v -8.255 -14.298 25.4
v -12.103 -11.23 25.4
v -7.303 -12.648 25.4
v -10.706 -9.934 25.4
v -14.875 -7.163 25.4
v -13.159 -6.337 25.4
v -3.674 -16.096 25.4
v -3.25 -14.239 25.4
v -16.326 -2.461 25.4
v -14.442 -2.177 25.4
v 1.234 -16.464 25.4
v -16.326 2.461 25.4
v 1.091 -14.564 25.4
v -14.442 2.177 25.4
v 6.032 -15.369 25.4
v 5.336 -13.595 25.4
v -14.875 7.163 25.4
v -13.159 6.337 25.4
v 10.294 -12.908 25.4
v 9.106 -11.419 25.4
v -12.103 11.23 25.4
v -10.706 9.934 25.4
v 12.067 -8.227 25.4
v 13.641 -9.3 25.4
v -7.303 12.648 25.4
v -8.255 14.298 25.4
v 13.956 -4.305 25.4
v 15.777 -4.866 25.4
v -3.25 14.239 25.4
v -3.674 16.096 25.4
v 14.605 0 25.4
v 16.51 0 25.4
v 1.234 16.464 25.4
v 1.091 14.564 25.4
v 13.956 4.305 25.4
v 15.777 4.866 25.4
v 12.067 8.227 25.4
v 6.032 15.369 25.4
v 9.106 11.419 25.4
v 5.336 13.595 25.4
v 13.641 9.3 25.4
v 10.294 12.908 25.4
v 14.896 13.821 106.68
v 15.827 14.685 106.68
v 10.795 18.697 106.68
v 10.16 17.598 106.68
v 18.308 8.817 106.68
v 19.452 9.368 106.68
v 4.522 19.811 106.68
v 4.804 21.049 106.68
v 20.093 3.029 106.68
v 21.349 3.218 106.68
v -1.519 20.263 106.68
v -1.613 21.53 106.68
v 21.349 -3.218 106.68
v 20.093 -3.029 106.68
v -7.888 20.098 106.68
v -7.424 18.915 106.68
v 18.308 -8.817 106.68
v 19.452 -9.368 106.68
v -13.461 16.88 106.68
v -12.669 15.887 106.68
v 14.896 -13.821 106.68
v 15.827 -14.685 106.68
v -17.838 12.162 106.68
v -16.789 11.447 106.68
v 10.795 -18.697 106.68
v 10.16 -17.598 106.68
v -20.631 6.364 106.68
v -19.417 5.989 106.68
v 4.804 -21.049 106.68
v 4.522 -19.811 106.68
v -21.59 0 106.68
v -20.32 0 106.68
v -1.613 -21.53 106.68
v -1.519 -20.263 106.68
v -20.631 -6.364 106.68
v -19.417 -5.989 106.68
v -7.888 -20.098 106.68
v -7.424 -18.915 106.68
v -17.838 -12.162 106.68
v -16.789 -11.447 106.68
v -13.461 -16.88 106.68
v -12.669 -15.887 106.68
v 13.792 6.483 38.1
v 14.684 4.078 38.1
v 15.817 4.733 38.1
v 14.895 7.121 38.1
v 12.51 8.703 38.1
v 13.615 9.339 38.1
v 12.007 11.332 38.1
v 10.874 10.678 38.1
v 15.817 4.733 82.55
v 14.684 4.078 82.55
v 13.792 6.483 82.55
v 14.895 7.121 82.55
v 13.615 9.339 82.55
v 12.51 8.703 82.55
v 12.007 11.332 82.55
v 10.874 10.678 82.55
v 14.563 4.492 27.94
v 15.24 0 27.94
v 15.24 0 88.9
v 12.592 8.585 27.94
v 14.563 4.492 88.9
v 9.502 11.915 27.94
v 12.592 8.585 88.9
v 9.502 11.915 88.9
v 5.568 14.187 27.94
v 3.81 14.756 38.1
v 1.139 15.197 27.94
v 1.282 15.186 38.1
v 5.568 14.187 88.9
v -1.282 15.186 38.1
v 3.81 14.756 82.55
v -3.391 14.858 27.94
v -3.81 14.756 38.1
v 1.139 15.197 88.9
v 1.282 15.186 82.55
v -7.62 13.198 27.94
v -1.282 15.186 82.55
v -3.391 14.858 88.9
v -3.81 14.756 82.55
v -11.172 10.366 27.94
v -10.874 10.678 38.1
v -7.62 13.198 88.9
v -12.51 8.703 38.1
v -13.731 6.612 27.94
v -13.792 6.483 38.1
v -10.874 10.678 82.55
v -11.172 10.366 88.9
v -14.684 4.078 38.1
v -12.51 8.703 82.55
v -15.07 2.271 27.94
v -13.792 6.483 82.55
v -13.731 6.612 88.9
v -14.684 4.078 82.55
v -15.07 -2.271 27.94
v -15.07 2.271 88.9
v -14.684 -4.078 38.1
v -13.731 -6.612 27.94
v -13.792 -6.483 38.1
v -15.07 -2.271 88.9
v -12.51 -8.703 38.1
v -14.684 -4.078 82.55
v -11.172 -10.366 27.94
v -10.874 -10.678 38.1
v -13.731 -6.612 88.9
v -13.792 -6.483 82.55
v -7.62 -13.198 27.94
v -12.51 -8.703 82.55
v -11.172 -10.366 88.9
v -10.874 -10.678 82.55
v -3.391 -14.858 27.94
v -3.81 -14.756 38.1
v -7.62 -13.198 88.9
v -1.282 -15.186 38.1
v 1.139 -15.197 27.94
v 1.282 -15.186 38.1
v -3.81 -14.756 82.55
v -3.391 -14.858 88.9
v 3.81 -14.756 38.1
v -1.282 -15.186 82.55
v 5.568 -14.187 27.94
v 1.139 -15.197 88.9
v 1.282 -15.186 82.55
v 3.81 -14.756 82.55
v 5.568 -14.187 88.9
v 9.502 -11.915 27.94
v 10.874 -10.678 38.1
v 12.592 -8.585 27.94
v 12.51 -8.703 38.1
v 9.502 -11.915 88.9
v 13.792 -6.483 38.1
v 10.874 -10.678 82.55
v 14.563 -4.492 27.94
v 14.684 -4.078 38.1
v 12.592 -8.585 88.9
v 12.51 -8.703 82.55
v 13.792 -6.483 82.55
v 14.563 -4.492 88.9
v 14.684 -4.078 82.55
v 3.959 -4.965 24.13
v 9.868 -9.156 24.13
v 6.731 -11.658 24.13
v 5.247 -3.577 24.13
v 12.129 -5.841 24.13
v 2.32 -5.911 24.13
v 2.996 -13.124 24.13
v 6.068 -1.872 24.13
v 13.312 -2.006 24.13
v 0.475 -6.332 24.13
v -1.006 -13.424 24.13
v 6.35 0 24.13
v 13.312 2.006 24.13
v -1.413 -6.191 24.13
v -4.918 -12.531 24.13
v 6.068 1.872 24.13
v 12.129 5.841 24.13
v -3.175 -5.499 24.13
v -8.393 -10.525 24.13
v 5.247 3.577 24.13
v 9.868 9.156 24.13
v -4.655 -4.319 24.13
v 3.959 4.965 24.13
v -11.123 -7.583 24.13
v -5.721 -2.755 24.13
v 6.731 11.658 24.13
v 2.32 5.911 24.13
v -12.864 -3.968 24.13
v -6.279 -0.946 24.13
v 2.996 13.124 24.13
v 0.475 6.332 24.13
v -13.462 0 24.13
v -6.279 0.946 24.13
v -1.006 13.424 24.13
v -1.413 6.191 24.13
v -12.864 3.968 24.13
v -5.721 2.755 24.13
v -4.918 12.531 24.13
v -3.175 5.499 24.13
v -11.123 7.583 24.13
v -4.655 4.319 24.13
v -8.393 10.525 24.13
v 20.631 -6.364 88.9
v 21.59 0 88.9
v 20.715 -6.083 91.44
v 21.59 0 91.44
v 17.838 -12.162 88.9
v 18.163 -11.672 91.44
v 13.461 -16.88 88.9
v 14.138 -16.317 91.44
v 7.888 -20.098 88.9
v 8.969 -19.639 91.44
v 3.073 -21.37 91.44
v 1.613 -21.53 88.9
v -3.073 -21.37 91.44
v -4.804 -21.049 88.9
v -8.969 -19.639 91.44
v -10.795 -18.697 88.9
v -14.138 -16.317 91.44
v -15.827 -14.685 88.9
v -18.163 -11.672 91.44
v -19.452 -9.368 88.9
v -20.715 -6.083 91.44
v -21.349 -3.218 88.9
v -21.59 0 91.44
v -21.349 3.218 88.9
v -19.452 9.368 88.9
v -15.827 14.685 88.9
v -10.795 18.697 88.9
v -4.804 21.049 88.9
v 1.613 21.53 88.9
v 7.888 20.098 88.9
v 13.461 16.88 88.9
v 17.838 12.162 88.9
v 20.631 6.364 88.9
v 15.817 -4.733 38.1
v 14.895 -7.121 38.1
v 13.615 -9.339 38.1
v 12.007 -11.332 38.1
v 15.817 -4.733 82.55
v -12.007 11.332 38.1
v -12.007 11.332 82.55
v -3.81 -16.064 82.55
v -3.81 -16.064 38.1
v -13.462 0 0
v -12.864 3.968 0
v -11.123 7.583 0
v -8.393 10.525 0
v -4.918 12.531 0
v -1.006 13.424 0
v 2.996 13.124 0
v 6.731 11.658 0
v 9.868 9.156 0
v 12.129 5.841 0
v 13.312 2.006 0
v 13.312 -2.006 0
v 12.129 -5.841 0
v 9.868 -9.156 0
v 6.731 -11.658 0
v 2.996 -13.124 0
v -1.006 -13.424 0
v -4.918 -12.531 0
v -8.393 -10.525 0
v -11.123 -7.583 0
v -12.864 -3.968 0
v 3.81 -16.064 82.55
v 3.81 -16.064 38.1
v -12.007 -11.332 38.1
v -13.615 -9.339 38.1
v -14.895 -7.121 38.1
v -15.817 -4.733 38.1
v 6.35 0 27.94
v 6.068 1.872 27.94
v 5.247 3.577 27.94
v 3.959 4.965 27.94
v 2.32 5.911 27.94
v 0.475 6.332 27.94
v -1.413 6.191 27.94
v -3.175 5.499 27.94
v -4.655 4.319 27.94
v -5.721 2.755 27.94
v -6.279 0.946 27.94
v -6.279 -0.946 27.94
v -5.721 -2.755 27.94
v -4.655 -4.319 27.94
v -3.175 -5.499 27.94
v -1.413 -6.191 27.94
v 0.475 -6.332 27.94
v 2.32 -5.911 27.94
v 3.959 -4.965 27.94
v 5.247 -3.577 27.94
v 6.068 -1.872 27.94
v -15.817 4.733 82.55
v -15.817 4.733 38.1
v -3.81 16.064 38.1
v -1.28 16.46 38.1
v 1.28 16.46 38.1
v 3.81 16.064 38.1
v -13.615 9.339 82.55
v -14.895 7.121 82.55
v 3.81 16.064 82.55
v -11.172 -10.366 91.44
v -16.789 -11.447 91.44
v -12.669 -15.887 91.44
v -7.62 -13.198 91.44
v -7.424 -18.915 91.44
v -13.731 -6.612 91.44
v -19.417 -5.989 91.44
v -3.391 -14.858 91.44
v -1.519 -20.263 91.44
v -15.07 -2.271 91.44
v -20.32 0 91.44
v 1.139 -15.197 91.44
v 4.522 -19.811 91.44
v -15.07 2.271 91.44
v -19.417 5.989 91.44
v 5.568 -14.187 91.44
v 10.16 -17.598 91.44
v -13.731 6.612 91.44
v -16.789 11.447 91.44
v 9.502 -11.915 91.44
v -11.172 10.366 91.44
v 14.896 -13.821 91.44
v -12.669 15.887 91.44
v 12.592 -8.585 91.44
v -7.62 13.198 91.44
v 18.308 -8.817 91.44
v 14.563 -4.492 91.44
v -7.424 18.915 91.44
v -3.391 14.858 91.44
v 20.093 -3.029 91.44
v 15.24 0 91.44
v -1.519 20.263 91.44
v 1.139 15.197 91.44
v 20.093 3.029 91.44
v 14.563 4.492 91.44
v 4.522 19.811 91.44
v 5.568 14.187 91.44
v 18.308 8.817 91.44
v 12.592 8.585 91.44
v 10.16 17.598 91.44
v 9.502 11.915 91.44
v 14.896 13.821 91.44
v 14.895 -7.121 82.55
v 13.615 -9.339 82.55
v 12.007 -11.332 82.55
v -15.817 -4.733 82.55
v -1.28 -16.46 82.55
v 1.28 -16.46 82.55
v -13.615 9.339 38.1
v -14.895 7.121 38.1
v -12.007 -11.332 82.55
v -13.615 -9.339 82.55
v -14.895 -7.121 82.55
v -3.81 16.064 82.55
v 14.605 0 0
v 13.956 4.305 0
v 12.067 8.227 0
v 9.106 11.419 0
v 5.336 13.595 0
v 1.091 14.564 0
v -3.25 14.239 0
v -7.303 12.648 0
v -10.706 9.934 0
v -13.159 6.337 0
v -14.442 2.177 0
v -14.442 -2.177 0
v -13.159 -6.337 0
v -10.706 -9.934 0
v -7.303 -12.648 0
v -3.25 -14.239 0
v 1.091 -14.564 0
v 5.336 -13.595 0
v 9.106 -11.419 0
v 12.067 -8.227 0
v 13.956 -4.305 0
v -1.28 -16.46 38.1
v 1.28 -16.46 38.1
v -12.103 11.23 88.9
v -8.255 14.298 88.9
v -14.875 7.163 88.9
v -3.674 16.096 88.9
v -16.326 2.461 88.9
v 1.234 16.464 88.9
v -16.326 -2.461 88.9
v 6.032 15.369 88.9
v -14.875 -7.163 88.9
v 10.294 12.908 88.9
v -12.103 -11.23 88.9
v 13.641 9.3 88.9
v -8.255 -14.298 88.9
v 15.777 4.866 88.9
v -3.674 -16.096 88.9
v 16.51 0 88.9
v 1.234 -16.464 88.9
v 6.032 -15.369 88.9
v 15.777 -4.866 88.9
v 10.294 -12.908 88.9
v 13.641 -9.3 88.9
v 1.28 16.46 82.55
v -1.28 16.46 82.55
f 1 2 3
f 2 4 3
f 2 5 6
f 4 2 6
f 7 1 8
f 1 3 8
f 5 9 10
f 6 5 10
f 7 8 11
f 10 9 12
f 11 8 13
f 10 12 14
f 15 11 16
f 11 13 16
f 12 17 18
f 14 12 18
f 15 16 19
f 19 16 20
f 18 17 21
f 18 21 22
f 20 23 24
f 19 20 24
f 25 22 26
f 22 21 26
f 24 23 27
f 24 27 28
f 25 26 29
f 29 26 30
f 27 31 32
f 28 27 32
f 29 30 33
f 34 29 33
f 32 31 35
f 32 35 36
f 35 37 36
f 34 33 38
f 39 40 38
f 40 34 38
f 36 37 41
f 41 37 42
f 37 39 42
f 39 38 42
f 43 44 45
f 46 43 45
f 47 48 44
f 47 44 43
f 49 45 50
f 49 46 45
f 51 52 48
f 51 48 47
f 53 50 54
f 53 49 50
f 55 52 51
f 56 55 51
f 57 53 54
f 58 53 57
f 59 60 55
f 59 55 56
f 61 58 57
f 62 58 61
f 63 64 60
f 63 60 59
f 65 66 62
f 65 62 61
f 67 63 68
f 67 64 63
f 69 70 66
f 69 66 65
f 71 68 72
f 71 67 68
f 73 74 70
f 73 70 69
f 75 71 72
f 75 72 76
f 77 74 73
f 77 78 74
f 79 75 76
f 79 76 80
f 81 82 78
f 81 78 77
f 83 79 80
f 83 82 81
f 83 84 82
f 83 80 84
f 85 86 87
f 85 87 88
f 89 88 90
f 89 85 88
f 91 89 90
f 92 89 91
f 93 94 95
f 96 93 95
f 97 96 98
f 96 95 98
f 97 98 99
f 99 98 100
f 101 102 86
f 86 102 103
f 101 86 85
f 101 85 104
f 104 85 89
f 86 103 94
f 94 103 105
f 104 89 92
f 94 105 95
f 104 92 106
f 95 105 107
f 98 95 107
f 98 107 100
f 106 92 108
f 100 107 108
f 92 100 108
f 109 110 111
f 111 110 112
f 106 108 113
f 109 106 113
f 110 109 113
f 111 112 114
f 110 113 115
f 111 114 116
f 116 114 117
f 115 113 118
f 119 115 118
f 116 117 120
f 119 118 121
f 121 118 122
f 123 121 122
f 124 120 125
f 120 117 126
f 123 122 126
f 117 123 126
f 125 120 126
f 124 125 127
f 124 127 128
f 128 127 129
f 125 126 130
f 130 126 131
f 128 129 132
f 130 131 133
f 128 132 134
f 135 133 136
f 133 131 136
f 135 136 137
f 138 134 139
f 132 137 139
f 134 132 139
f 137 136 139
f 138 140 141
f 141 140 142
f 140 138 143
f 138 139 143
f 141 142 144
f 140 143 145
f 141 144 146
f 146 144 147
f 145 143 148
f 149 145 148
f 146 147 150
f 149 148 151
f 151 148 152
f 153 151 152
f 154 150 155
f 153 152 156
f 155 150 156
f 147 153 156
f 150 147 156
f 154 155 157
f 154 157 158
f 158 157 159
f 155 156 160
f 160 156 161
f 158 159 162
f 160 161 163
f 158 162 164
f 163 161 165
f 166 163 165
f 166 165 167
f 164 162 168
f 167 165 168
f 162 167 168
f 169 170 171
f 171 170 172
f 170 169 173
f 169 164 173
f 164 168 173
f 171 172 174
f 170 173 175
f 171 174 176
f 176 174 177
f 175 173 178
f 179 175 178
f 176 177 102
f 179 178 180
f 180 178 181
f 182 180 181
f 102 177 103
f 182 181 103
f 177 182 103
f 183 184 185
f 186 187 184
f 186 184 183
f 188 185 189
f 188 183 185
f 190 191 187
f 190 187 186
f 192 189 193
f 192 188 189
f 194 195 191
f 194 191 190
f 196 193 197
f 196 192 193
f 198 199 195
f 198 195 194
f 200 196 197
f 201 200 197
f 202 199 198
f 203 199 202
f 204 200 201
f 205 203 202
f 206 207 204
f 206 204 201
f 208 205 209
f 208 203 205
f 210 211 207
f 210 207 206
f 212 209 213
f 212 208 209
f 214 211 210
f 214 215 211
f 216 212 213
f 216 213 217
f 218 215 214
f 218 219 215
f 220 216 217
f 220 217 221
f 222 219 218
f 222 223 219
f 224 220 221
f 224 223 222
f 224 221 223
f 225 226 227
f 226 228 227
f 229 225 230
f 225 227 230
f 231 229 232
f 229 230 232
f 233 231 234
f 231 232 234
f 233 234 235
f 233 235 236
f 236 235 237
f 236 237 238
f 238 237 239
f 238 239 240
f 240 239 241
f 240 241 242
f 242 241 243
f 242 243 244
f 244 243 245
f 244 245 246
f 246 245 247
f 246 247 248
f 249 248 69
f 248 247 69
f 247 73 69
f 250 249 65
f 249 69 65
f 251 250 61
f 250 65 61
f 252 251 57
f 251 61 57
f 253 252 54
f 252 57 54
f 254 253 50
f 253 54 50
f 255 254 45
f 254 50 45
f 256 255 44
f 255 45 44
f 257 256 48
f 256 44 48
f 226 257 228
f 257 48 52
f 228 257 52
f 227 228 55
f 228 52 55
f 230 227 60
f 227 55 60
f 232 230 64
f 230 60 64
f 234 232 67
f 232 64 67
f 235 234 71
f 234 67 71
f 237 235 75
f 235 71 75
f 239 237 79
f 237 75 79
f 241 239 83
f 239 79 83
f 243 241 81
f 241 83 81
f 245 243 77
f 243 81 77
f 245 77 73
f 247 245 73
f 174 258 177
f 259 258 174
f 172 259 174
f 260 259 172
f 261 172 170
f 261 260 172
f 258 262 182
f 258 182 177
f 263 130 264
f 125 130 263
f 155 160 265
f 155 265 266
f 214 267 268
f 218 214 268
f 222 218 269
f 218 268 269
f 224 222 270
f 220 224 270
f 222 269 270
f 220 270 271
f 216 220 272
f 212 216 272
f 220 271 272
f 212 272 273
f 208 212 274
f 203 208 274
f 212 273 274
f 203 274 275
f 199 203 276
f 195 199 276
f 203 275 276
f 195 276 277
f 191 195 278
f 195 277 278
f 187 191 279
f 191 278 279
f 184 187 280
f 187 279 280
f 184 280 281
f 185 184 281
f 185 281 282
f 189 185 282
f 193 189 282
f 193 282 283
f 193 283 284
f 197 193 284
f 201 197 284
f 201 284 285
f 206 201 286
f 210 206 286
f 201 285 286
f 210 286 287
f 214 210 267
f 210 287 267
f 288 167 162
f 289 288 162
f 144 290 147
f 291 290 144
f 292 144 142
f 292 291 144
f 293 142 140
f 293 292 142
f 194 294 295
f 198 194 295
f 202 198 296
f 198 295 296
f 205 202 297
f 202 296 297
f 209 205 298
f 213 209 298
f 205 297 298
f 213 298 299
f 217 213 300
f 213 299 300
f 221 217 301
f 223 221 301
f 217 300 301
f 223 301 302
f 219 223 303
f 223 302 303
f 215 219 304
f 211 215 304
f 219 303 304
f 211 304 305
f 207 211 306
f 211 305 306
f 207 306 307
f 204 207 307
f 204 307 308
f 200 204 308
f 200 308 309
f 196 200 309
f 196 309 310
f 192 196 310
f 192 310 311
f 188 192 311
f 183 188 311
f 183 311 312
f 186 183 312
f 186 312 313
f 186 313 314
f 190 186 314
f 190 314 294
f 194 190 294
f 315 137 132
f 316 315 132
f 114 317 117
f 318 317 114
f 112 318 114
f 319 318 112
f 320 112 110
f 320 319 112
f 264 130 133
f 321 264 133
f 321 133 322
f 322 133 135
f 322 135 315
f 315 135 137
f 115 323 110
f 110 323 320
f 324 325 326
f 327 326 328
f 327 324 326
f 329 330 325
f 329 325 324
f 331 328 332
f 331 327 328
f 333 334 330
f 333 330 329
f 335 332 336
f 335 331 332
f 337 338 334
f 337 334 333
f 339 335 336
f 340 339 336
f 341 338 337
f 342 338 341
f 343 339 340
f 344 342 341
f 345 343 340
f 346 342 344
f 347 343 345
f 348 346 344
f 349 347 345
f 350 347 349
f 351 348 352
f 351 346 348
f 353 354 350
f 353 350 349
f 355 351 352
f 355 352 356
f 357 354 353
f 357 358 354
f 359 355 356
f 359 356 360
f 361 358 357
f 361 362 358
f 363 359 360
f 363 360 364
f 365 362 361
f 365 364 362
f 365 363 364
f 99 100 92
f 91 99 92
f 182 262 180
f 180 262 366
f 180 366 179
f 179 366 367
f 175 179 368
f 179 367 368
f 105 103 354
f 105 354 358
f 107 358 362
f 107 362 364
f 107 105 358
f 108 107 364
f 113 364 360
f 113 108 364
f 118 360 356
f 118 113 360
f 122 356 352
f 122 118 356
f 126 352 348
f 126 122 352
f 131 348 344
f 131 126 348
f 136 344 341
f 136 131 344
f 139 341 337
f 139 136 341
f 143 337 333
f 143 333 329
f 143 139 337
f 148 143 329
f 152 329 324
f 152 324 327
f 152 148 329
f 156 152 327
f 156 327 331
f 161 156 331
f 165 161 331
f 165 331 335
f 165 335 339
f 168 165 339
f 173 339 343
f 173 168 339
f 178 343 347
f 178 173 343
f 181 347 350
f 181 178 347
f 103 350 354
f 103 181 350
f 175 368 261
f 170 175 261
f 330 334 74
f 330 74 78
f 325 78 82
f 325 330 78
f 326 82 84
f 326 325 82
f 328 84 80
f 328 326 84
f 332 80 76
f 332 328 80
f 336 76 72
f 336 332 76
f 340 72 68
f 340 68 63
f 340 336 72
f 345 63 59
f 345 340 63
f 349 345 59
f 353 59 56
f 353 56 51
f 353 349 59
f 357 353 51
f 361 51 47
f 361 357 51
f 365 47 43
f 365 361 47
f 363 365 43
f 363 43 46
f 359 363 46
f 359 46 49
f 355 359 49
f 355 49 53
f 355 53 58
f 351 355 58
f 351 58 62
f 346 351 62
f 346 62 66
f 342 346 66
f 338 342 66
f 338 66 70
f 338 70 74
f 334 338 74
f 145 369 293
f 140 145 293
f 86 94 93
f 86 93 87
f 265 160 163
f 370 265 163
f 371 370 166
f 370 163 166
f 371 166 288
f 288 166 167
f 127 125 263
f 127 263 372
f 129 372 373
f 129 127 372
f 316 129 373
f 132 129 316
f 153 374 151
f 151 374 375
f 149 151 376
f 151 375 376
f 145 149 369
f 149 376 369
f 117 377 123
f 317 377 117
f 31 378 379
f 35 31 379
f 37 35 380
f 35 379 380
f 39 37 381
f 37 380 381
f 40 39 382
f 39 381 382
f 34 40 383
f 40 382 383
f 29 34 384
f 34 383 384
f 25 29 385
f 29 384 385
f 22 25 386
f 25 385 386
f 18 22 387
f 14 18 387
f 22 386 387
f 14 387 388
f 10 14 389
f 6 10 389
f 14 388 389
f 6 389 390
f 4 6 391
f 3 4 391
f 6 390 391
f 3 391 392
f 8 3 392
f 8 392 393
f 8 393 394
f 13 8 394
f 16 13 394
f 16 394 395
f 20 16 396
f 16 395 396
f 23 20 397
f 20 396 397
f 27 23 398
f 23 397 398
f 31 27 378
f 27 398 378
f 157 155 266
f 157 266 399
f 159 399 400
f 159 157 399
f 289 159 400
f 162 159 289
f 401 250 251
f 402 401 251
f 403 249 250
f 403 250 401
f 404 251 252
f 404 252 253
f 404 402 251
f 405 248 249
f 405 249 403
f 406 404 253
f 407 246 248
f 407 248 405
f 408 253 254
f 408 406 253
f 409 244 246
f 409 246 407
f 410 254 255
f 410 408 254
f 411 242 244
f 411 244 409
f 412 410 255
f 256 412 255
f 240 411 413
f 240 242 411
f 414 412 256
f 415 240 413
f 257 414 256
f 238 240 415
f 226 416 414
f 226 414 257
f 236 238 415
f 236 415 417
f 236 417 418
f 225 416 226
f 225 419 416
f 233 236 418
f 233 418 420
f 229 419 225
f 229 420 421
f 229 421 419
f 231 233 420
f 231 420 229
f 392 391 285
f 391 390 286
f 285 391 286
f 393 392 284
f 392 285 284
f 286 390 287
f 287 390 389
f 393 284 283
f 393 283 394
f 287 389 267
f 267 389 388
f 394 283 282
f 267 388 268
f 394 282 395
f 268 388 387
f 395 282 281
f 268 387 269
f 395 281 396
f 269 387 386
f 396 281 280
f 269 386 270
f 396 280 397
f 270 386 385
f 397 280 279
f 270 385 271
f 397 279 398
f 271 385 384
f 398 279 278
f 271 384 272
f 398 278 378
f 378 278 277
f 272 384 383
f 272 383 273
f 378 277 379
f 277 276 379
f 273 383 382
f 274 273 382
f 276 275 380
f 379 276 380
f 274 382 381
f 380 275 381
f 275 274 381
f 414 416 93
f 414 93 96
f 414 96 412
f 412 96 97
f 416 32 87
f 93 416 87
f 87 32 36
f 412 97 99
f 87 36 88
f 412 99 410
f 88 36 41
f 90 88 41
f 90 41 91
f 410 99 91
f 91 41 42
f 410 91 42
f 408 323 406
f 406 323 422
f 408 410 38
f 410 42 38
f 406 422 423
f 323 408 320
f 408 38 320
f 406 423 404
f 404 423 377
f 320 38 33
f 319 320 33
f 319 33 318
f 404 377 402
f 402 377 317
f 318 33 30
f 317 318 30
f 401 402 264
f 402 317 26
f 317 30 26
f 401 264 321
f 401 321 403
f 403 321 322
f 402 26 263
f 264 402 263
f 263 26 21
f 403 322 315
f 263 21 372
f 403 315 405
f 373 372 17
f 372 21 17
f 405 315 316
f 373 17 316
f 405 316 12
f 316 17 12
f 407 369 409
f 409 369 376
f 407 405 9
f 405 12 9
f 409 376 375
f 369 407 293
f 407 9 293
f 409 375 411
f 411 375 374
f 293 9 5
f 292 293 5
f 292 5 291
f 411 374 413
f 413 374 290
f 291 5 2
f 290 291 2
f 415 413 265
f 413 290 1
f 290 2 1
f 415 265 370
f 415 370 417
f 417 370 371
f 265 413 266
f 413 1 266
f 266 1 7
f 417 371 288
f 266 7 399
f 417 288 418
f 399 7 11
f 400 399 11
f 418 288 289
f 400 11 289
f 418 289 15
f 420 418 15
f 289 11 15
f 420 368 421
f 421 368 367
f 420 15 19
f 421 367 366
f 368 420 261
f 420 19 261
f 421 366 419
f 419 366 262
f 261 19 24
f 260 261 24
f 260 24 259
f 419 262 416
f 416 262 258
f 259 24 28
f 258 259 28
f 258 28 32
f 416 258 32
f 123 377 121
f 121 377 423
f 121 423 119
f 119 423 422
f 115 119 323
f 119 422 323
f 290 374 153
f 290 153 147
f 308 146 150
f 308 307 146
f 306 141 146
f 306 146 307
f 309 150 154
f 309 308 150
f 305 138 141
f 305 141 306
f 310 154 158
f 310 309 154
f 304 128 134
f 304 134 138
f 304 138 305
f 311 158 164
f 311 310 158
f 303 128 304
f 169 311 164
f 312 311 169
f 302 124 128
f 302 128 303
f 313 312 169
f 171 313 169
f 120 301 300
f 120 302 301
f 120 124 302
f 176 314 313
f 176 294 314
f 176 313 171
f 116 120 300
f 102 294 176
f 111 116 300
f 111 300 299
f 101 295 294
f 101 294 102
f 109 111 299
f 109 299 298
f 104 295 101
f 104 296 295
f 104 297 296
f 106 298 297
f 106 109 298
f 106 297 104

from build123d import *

# Parameters (mm, degrees)
SKETCH1_R           = 14.605
BOSS_EXTRUDE1_DEPTH = 25.4
SKETCH2_R           = 16.51
BOSS_EXTRUDE2_DEPTH = 63.5
SKETCH5_R           = 13.462
CUT_EXTRUDE1_DEPTH  = 24.13
SKETCH6_R           = 15.24
CUT_EXTRUDE3_DEPTH  = 60.96
CUT_EXTRUDE4_REACH  = 67.278
SKETCH7_R           = 6.35
SKETCH9_W           = 7.62
SKETCH9_H           = 44.45
CUT_EXTRUDE5_DEPTH  = 92.915016183
CIRPATTERN1_COUNT   = 3
SKETCH10_R          = 20.32
SKETCH10_R_2        = 15.24
BOSS_EXTRUDE3_DEPTH = 2.54
SKETCH11_R          = 21.59
SKETCH11_R_2        = 20.32
BOSS_EXTRUDE4_DEPTH = 15.24
SKETCH12_R          = 21.59
SKETCH12_R_2        = 20.32
BOSS_EXTRUDE5_DEPTH = 2.54


with BuildPart() as part:
    # Sketch1 → Boss-Extrude1 (new body)
    with BuildSketch(Plane.XY):
        Circle(SKETCH1_R)
    extrude(amount=BOSS_EXTRUDE1_DEPTH)

    # Sketch2 → Boss-Extrude2 (add)
    with BuildSketch(Plane.XY.offset(25.4)):
        Circle(SKETCH2_R)
    extrude(amount=BOSS_EXTRUDE2_DEPTH)

    # Sketch5 → Cut-Extrude1 (cut)
    with BuildSketch(Plane(origin=(0, 0, 0), x_dir=(-1, 0, 0), z_dir=(0, 0, -1))):
        Circle(SKETCH5_R)
    extrude(amount=-CUT_EXTRUDE1_DEPTH, mode=Mode.SUBTRACT)

    # Sketch6 → Cut-Extrude3 (cut)
    with BuildSketch(Plane.XY.offset(88.9)):
        Circle(SKETCH6_R)
    extrude(amount=-CUT_EXTRUDE3_DEPTH, mode=Mode.SUBTRACT)

    # Sketch7 → Cut-Extrude4 (cut, up to next)
    with BuildSketch(Plane.XY.offset(27.94), mode=Mode.PRIVATE) as cut_extrude4_sk1:
        Circle(SKETCH7_R)
    cut_extrude4_tool1 = extrude(cut_extrude4_sk1.sketch, amount=-CUT_EXTRUDE4_REACH, mode=Mode.PRIVATE) & part.part
    add(cut_extrude4_tool1.solids().sort_by_distance((0, 0, 27.94))[0], mode=Mode.SUBTRACT)

    # Sketch9 → Cut-Extrude5 (cut, symmetric)
    with BuildSketch(Plane(origin=(0, 0, 0), x_dir=(1, 0, 0), z_dir=(0, 1, 0))):
        with Locations((0, -60.325)):
            Rectangle(SKETCH9_W, SKETCH9_H)
    cut_extrude5 = extrude(amount=CUT_EXTRUDE5_DEPTH, both=True, mode=Mode.SUBTRACT)

    # CirPattern1: Cut-Extrude5 ×3 about axis
    cirpattern1_axis = Axis((0, 0, 0), (0, 0, 1))
    for i in range(1, CIRPATTERN1_COUNT):
        add(cut_extrude5.rotate(cirpattern1_axis, i * 360 / CIRPATTERN1_COUNT), mode=Mode.SUBTRACT)



with BuildPart() as body_2:
    # Sketch10 → Boss-Extrude3 (new body)
    with BuildSketch(Plane.XY.offset(88.9)):
        Circle(SKETCH10_R)
        Circle(SKETCH10_R_2, mode=Mode.SUBTRACT)
    extrude(amount=BOSS_EXTRUDE3_DEPTH)


with BuildPart() as body_3:
    # Sketch11 → Boss-Extrude4 (new body)
    with BuildSketch(Plane.XY.offset(91.44)):
        with Locations(Location((0, 0, 0), (0, 0, 180))):
            Circle(SKETCH11_R)
        with Locations(Location((0, 0, 0), (0, 0, 180))):
            Circle(SKETCH11_R_2, mode=Mode.SUBTRACT)
    extrude(amount=BOSS_EXTRUDE4_DEPTH)


with BuildPart() as part_1:
    add(part.part)

    add(body_2.part)  # Boss-Extrude5 merges body 2

    add(body_3.part)  # Boss-Extrude5 merges body 3
    # Sketch12 → Boss-Extrude5 (add)
    with BuildSketch(Plane(origin=(0, 0, 91.44), x_dir=(-1, 0, 0), z_dir=(0, 0, -1))):
        with Locations(Location((0, 0, 0), (0, 0, 180))):
            Circle(SKETCH12_R)
        Circle(SKETCH12_R_2, mode=Mode.SUBTRACT)
    extrude(amount=BOSS_EXTRUDE5_DEPTH)


solid = part_1.part
